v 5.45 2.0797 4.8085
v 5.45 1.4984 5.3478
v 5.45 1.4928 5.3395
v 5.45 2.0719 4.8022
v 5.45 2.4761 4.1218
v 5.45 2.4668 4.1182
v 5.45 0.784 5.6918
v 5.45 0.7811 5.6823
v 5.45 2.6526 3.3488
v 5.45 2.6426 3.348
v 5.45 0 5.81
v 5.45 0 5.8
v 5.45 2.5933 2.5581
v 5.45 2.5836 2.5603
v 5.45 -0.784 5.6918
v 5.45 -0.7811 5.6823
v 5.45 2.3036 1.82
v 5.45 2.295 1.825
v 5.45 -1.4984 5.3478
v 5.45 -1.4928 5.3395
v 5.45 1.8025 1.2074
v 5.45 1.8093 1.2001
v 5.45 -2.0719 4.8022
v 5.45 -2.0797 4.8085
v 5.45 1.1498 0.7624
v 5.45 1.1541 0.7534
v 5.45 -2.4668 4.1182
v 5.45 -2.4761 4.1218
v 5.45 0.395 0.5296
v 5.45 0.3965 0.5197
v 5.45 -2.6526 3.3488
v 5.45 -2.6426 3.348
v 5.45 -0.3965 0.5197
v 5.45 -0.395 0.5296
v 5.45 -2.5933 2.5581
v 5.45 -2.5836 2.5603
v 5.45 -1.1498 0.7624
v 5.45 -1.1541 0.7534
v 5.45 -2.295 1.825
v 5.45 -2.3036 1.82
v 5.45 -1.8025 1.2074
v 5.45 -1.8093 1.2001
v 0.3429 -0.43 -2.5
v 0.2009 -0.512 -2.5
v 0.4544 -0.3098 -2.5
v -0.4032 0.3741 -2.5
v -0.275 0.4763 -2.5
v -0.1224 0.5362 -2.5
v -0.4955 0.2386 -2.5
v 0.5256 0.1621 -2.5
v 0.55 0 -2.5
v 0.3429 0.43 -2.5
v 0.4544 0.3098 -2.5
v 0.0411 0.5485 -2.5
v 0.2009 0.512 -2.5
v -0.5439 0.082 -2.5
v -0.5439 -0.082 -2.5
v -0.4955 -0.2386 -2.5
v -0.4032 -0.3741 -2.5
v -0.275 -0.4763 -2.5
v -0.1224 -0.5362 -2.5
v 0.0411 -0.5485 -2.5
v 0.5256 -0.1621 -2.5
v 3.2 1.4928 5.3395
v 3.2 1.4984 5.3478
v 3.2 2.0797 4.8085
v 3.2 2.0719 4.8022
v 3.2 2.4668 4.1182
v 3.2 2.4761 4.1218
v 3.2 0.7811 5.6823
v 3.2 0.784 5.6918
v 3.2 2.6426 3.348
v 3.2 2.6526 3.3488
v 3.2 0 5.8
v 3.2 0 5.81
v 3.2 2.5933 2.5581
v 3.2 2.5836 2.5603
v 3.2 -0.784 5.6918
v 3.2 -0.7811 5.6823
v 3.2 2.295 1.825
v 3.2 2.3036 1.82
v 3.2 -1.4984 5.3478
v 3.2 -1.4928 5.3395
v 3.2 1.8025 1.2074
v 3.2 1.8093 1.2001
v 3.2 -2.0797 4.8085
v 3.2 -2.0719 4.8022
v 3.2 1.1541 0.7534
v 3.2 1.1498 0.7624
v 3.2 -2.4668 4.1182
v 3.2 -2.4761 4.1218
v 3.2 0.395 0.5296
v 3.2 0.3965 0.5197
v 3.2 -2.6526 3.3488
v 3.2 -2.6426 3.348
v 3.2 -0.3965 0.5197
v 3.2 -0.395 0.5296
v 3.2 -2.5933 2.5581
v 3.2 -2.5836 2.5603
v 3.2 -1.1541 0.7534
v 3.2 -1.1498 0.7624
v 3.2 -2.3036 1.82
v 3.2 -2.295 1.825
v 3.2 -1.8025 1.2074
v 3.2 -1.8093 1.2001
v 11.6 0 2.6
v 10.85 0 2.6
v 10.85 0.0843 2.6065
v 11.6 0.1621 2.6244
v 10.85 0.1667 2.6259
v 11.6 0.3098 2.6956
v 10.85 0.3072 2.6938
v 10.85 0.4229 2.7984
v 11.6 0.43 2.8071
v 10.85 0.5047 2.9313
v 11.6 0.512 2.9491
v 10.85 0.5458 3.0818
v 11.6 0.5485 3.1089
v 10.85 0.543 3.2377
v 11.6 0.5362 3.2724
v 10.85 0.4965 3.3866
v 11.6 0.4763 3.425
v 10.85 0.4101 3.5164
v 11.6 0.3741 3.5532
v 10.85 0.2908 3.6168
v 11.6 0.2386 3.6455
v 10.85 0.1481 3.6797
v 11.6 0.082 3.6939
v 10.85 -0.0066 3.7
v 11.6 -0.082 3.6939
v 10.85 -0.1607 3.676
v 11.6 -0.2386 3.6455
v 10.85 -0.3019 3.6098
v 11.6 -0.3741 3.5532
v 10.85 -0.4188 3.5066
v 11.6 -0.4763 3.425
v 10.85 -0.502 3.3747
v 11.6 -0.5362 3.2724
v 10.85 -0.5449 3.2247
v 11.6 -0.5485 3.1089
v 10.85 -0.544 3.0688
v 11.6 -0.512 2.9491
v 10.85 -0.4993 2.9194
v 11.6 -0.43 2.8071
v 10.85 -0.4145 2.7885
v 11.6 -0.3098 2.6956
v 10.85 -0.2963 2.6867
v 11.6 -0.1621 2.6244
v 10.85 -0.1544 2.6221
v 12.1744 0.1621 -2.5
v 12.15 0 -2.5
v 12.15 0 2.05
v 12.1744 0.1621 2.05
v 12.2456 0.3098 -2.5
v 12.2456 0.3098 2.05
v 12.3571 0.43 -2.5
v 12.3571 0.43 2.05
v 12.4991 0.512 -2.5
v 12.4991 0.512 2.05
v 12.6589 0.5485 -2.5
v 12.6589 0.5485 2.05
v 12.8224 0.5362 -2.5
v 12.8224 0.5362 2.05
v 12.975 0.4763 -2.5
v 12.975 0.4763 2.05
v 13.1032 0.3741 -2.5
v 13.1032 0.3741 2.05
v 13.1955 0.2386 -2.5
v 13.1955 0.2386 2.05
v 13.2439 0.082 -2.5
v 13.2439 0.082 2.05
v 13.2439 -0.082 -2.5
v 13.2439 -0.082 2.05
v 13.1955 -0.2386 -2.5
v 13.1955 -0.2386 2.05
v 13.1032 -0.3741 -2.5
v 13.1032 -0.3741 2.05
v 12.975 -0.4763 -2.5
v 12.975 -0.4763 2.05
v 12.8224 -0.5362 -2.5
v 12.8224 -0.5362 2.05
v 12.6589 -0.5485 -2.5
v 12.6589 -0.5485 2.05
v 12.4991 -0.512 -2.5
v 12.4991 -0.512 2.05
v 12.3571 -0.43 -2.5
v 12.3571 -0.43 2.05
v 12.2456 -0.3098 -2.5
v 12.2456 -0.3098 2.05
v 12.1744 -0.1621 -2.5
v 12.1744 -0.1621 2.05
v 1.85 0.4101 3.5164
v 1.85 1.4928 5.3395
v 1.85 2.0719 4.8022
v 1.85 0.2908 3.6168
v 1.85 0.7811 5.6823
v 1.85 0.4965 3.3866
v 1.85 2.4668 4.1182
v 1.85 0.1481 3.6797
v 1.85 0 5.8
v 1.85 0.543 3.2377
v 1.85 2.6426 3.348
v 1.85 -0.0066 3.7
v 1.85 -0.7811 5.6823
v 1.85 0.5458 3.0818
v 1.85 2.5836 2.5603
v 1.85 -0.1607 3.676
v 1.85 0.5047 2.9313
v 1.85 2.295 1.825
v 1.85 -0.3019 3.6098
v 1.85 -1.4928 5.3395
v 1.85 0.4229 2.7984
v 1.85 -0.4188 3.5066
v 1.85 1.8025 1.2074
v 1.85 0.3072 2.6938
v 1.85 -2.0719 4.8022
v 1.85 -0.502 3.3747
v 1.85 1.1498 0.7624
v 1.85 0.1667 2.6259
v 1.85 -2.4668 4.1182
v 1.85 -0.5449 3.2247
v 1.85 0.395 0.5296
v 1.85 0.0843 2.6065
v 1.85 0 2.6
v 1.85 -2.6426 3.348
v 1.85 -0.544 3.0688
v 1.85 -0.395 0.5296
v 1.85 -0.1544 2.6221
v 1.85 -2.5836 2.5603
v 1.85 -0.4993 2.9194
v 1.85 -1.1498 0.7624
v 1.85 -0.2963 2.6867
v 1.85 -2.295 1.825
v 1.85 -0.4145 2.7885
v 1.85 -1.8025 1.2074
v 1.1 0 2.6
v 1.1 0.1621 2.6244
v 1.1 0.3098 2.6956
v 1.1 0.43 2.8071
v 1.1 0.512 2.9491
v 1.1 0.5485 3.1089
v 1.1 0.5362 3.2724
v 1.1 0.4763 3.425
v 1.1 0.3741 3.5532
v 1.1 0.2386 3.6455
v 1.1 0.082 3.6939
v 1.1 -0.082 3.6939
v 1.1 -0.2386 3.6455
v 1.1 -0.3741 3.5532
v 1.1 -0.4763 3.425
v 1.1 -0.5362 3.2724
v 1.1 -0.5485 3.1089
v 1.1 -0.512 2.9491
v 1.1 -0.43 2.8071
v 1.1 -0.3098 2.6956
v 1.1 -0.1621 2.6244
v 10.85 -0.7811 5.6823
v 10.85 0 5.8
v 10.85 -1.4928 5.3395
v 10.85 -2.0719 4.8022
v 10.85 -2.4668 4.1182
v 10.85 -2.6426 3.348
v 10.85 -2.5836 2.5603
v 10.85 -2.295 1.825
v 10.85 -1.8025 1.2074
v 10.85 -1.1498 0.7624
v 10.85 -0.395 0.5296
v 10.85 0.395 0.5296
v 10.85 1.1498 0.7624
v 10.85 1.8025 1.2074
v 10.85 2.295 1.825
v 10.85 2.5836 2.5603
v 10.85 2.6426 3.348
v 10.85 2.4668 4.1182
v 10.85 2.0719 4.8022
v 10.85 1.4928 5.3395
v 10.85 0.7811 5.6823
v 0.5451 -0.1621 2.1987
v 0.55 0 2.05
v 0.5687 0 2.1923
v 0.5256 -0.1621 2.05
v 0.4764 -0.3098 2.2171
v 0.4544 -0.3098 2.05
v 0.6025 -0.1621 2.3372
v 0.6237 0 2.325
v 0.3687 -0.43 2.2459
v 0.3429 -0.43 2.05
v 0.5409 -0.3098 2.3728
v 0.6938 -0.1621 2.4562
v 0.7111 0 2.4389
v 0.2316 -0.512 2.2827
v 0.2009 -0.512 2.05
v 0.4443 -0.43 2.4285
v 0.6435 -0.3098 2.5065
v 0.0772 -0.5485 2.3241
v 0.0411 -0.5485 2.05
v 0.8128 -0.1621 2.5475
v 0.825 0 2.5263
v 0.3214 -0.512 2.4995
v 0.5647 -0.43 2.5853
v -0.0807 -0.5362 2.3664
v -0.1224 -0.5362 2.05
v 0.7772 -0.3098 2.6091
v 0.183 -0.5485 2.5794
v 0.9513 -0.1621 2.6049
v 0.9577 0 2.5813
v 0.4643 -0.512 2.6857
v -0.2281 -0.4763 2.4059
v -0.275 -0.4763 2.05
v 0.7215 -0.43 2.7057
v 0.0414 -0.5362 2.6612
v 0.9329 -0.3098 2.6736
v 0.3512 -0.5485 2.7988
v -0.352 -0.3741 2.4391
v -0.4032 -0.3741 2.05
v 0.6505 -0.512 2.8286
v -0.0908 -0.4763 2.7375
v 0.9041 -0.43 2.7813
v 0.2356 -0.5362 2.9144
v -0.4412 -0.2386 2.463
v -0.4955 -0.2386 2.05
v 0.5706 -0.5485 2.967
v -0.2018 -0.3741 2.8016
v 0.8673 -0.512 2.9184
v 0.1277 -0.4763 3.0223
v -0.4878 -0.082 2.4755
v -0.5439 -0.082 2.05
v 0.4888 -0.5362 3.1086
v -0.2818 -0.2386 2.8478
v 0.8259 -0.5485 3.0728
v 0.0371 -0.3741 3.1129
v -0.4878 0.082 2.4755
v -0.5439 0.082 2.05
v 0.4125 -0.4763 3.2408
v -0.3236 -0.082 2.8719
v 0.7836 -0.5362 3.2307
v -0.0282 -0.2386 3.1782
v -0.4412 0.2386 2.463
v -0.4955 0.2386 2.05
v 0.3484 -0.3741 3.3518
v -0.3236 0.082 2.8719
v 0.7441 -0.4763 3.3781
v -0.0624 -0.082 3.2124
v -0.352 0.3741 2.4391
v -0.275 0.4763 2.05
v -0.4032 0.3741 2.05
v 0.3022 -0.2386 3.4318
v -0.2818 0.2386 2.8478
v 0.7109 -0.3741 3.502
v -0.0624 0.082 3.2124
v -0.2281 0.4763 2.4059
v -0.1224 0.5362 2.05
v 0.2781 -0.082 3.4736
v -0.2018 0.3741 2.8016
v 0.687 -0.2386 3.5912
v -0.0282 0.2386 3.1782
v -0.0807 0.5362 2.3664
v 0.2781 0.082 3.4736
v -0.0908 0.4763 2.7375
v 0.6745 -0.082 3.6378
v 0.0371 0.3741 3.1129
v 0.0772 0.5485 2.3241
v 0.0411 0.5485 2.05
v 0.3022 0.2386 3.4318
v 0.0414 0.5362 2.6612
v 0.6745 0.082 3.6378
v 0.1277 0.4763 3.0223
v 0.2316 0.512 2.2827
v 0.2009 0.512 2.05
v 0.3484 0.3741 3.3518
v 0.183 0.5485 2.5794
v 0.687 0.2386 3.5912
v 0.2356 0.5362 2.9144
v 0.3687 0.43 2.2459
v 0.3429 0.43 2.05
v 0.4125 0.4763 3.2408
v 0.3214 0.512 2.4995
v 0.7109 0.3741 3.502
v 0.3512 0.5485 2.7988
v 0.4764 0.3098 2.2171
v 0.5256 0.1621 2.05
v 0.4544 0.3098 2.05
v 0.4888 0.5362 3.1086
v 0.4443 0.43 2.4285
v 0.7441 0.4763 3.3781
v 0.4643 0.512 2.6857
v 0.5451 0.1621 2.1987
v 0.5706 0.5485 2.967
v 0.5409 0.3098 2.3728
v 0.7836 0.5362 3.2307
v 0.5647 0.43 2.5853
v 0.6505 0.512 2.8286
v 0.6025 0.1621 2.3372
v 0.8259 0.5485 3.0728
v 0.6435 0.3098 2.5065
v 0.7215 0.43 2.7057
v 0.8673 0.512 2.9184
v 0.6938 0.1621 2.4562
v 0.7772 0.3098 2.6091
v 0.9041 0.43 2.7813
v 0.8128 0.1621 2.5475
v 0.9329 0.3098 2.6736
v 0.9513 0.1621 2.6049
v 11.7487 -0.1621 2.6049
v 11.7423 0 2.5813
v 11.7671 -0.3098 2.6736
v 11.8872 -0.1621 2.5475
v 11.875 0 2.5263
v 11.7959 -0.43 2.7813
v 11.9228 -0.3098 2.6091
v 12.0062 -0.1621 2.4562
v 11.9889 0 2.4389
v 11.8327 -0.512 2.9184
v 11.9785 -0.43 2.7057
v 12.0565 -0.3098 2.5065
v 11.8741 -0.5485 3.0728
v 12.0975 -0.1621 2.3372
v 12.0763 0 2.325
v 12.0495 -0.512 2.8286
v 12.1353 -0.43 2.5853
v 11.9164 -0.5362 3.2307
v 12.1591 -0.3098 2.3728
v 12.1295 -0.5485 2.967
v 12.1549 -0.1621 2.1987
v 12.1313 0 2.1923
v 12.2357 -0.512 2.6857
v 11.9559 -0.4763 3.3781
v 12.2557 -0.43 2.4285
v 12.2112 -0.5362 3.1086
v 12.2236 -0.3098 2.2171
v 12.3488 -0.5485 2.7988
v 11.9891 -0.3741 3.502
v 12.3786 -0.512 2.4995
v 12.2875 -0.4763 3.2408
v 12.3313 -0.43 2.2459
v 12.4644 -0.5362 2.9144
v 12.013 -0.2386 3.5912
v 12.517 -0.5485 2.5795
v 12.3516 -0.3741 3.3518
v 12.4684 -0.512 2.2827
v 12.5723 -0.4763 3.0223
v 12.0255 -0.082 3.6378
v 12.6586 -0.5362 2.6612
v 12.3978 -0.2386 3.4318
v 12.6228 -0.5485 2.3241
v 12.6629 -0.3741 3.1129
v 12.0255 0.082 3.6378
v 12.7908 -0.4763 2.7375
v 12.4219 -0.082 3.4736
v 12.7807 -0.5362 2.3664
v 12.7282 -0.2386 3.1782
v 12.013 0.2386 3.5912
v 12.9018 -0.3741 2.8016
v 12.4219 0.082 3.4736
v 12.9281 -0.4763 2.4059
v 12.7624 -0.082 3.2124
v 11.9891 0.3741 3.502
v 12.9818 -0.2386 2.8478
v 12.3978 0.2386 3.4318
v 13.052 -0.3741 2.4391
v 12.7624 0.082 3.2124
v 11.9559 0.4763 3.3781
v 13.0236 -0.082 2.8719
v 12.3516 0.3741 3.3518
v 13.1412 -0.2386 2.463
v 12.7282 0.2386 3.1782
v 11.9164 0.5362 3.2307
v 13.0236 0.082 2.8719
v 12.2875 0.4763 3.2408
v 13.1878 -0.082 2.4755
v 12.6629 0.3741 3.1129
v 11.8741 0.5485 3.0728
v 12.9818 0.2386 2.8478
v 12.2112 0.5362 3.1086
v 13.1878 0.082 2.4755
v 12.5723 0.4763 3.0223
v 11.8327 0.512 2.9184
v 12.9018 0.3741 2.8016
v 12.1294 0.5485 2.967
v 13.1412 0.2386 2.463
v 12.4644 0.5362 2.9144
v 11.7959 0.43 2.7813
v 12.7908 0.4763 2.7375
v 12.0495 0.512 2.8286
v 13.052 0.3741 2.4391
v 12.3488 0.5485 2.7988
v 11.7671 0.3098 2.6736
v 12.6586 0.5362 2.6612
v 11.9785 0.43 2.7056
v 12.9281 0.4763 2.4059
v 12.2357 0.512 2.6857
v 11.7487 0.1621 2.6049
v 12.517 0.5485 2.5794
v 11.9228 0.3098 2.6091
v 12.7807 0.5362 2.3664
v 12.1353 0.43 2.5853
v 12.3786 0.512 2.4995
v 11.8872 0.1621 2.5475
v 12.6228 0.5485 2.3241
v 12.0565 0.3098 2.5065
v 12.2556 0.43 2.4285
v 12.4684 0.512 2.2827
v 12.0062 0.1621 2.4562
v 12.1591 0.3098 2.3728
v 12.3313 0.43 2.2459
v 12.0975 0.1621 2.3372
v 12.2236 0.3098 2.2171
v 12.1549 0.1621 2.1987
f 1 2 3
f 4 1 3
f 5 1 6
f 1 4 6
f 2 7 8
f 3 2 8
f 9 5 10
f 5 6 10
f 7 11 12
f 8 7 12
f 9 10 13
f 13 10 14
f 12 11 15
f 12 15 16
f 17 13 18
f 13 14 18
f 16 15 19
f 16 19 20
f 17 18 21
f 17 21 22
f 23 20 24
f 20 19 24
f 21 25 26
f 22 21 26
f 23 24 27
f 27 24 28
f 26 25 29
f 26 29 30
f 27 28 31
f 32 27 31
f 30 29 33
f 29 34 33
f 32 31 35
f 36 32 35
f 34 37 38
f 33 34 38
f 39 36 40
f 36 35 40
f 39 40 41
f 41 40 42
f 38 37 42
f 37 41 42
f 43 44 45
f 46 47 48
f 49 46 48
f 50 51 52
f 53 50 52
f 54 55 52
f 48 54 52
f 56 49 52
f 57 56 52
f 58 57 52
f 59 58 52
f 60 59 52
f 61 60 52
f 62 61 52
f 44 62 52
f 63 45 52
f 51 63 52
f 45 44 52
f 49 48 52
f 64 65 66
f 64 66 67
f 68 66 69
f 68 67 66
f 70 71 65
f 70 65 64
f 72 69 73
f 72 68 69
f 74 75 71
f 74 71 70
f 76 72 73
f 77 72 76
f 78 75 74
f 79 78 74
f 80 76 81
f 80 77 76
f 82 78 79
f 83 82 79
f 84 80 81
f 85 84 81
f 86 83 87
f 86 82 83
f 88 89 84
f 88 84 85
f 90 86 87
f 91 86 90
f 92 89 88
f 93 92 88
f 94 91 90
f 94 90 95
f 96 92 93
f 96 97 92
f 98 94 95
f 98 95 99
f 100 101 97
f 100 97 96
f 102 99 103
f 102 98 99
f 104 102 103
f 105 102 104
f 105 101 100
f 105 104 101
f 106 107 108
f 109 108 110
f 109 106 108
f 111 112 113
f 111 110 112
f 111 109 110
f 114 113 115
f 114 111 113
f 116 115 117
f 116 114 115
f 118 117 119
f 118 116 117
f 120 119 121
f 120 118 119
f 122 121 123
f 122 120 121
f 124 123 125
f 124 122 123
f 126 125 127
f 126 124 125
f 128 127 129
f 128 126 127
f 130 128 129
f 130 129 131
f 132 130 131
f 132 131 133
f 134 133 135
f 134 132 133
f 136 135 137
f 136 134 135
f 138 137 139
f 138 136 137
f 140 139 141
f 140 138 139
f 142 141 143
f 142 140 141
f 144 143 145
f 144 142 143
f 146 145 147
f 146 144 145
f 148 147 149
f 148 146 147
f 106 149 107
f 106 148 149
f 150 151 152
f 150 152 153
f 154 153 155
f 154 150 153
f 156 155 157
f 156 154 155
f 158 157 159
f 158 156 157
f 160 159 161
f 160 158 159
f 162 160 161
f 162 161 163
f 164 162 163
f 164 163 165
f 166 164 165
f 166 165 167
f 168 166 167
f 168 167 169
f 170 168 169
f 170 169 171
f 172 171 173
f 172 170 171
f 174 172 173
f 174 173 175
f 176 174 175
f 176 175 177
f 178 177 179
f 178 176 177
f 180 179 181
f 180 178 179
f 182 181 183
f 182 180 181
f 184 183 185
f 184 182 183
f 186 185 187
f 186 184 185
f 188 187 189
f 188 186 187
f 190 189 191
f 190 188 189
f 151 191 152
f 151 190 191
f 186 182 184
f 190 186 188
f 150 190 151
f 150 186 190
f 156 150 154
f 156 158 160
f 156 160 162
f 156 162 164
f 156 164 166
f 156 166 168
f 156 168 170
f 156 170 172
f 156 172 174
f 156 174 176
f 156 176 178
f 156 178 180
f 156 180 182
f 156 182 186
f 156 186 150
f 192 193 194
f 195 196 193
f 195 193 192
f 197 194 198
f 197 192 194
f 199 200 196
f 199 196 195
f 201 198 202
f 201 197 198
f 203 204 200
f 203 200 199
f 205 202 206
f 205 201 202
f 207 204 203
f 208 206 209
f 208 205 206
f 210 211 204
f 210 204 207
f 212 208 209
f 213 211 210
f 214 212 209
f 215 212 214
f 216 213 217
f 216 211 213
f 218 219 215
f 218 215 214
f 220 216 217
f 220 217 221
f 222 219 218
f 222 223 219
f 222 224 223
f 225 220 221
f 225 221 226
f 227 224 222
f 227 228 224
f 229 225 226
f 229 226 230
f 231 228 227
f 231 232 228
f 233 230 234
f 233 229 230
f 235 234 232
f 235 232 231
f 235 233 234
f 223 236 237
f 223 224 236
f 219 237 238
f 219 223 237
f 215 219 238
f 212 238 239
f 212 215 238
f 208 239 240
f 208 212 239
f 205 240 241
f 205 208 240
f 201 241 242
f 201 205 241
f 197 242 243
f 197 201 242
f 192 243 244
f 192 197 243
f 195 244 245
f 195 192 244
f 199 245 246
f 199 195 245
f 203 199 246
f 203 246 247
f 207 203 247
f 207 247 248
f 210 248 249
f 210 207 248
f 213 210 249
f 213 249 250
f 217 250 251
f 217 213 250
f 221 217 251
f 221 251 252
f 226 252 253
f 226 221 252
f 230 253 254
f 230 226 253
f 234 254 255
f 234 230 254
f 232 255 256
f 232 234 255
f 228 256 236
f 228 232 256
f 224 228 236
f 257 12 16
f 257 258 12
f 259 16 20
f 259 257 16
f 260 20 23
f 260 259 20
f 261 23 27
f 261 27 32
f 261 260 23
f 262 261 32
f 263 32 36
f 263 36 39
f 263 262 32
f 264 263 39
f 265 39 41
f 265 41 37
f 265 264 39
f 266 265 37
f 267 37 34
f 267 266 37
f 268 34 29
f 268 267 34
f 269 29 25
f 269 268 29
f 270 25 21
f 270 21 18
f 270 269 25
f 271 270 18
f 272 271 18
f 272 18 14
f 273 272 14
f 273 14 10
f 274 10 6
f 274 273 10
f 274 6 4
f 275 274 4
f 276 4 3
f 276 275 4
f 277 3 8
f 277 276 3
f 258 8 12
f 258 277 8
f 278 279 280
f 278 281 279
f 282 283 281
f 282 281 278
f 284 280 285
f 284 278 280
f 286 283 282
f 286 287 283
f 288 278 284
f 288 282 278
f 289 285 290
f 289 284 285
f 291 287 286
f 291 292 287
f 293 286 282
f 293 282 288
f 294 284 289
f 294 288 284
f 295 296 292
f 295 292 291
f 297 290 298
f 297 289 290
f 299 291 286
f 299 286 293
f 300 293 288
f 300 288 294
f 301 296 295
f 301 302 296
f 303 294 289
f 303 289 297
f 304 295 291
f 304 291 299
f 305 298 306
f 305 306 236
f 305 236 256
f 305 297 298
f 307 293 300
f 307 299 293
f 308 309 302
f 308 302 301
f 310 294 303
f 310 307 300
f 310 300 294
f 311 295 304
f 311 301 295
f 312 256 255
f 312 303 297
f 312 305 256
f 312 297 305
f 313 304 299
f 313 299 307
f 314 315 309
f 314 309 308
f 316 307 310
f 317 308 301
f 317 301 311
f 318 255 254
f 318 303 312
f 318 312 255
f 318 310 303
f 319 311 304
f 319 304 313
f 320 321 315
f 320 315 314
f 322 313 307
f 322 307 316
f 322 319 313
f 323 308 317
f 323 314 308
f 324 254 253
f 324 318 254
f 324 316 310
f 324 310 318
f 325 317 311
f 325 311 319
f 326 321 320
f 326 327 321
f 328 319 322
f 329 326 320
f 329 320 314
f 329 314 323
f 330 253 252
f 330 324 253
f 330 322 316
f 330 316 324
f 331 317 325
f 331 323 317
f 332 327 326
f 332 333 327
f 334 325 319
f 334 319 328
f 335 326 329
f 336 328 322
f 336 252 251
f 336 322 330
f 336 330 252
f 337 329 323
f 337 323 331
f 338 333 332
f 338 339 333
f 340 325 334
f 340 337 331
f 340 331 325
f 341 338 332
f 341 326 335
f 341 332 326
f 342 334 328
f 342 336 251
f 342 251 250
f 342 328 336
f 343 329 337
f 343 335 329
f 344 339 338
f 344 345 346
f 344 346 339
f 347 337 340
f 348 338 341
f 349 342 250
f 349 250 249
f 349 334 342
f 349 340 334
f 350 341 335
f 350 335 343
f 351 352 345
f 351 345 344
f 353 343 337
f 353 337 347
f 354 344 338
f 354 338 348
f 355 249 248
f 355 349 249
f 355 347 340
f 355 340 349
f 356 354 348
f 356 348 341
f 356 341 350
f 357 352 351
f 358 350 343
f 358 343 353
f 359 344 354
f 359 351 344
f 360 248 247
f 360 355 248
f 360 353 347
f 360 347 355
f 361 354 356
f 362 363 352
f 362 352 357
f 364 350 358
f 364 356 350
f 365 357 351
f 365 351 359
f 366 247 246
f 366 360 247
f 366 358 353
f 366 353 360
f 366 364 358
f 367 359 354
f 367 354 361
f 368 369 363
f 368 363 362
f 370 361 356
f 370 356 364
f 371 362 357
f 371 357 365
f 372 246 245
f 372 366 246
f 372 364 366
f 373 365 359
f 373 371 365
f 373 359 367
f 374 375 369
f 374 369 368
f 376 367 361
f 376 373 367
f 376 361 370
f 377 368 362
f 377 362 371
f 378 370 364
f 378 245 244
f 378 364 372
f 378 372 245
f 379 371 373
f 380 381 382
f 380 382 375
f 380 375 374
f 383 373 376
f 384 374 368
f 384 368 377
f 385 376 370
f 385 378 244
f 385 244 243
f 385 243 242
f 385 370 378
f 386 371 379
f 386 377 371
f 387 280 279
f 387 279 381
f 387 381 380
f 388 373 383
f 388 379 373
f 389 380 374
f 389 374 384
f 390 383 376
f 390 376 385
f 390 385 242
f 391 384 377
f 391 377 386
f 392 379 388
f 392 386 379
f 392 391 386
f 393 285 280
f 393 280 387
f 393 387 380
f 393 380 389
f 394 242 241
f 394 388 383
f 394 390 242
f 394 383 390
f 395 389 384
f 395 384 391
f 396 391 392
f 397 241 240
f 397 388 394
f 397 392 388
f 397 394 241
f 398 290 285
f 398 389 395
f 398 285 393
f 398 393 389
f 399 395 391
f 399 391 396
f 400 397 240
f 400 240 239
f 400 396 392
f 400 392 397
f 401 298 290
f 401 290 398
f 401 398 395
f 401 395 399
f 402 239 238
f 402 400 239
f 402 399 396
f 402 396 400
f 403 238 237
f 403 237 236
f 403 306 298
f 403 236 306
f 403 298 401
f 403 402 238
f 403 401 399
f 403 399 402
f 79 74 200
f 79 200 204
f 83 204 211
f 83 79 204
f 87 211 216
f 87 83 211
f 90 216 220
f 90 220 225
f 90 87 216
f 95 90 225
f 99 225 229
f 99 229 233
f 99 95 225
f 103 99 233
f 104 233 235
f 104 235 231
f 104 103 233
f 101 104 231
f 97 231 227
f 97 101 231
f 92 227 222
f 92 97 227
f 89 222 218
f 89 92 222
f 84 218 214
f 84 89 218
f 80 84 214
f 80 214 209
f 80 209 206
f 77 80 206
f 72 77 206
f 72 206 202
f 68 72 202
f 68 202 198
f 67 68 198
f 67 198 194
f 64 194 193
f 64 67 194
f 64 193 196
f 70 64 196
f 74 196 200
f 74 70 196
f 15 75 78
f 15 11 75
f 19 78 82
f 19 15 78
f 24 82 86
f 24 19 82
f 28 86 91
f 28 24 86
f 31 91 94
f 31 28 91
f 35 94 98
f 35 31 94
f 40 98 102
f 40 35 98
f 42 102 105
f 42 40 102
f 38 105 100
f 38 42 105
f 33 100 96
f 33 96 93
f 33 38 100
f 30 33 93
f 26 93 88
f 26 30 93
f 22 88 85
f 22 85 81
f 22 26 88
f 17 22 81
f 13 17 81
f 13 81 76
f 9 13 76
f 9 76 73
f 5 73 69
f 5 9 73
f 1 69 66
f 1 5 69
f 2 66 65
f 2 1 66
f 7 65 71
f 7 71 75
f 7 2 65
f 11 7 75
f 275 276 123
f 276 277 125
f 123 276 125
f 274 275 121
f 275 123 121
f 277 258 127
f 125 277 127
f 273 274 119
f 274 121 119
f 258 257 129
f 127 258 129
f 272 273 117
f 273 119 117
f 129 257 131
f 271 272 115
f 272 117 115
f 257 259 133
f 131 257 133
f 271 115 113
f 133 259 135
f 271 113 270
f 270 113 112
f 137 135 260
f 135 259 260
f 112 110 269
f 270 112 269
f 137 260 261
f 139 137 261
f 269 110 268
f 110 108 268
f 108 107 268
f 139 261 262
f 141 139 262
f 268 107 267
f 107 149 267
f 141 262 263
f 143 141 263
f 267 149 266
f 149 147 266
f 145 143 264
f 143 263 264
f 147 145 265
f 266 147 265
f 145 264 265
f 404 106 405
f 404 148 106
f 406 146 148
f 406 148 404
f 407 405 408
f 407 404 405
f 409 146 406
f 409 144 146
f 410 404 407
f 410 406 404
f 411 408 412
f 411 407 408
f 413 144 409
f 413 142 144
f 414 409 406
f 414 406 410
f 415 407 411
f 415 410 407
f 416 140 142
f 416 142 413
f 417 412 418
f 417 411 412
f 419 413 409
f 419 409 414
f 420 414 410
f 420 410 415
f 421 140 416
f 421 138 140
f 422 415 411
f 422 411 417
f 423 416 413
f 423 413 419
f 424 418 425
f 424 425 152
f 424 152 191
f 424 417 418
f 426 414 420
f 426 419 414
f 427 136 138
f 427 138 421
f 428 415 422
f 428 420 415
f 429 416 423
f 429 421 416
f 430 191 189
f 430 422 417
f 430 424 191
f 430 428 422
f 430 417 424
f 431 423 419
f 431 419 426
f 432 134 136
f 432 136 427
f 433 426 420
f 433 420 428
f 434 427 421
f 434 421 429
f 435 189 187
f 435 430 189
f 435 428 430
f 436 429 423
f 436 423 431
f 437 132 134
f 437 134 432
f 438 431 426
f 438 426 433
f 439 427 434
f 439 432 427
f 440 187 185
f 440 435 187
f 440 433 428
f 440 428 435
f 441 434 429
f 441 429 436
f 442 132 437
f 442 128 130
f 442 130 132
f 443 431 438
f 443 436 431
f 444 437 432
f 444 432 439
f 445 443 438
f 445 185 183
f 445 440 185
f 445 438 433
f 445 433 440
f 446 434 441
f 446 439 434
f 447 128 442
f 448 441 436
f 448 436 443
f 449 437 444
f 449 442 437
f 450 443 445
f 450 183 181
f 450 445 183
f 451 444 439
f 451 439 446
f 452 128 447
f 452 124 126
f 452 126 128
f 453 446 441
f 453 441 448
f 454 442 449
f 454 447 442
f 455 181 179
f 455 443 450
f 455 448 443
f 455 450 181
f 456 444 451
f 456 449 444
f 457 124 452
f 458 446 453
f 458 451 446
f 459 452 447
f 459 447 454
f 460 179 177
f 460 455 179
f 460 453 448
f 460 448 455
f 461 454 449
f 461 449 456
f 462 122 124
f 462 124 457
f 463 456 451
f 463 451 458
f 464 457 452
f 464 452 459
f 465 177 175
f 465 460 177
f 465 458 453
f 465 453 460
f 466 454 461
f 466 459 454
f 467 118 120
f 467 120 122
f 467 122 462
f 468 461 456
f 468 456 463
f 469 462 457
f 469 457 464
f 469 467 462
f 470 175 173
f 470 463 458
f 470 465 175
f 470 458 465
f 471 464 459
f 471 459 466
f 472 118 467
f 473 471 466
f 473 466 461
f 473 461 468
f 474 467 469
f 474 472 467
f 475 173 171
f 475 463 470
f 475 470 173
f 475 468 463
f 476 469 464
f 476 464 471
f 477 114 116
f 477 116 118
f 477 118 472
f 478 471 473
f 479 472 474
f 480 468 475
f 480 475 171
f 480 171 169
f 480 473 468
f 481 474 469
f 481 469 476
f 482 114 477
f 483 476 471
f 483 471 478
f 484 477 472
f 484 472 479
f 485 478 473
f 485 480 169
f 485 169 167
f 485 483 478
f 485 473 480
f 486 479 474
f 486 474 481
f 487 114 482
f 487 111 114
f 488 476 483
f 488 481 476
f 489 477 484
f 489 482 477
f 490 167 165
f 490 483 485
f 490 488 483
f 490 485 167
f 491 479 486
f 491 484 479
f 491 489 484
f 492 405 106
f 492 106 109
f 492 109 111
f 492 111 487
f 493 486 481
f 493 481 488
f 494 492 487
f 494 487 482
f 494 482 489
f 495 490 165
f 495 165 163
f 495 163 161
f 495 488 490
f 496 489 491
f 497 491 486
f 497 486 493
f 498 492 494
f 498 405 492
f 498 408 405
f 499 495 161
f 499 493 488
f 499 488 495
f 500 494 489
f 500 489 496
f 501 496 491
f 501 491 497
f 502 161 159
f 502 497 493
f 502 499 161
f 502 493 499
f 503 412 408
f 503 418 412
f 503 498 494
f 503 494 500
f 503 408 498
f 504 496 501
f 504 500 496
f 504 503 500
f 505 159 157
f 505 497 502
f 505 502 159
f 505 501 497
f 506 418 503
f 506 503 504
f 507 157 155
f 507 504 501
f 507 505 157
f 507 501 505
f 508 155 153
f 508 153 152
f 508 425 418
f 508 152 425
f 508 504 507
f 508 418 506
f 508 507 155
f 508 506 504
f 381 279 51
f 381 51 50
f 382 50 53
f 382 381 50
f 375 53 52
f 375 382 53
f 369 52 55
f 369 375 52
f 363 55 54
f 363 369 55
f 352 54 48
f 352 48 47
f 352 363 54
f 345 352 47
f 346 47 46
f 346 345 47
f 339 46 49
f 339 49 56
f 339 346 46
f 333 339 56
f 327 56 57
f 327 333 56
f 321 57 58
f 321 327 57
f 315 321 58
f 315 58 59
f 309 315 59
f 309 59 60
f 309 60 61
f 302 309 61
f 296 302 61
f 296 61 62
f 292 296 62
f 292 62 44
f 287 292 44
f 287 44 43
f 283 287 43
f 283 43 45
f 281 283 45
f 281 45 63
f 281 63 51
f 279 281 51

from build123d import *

# Parameters (mm, degrees)
SKETCH002_W = 9
SKETCH002_H = 2.65
SKETCH_R    = 0.55
SKETCH003_W = 2.25
SKETCH003_H = 0.02


with BuildPart() as revolution:
    # Sketch002 → Revolution (revolve)
    with BuildSketch(Plane.XZ):
        with Locations((6.35, 4.475)):
            Rectangle(SKETCH002_W, SKETCH002_H)
    revolve(axis=Axis((1.85, 0, 3.15), (1, 0, 0)))


with BuildPart() as sweep_body:
    # Sweep: sweep along a path in Sketch001
    with BuildLine(Plane.XZ) as sweep_path:
        Line((0, -2.5), (0, 2.05))
        ThreePointArc((0, 2.05), (0.322183, 2.827817), (1.1, 3.15))
        Line((1.1, 3.15), (11.6, 3.15))
        ThreePointArc((11.6, 3.15), (12.377817, 2.827817), (12.7, 2.05))
        Line((12.7, 2.05), (12.7, -2.5))
    # Sketch → Sweep (sweep)
    with BuildSketch(Plane.XY.offset(-2)):
        Circle(SKETCH_R)
    sweep(path=sweep_path.line)


with BuildPart() as d_do_201ae_p12_70mm_horizontal:
    # Sketch003 → Revolution001 (revolve)
    with BuildSketch(Plane.XZ):
        with Locations((4.325, 5.8)):
            Rectangle(SKETCH003_W, SKETCH003_H)
    revolve(axis=Axis((0, 0, 3.15), (1, 0, 0)))

    # Revolution001_mp_cp: union Revolution, Sweep body
    add(revolution.part)
    add(sweep_body.part)


solid = d_do_201ae_p12_70mm_horizontal.part
